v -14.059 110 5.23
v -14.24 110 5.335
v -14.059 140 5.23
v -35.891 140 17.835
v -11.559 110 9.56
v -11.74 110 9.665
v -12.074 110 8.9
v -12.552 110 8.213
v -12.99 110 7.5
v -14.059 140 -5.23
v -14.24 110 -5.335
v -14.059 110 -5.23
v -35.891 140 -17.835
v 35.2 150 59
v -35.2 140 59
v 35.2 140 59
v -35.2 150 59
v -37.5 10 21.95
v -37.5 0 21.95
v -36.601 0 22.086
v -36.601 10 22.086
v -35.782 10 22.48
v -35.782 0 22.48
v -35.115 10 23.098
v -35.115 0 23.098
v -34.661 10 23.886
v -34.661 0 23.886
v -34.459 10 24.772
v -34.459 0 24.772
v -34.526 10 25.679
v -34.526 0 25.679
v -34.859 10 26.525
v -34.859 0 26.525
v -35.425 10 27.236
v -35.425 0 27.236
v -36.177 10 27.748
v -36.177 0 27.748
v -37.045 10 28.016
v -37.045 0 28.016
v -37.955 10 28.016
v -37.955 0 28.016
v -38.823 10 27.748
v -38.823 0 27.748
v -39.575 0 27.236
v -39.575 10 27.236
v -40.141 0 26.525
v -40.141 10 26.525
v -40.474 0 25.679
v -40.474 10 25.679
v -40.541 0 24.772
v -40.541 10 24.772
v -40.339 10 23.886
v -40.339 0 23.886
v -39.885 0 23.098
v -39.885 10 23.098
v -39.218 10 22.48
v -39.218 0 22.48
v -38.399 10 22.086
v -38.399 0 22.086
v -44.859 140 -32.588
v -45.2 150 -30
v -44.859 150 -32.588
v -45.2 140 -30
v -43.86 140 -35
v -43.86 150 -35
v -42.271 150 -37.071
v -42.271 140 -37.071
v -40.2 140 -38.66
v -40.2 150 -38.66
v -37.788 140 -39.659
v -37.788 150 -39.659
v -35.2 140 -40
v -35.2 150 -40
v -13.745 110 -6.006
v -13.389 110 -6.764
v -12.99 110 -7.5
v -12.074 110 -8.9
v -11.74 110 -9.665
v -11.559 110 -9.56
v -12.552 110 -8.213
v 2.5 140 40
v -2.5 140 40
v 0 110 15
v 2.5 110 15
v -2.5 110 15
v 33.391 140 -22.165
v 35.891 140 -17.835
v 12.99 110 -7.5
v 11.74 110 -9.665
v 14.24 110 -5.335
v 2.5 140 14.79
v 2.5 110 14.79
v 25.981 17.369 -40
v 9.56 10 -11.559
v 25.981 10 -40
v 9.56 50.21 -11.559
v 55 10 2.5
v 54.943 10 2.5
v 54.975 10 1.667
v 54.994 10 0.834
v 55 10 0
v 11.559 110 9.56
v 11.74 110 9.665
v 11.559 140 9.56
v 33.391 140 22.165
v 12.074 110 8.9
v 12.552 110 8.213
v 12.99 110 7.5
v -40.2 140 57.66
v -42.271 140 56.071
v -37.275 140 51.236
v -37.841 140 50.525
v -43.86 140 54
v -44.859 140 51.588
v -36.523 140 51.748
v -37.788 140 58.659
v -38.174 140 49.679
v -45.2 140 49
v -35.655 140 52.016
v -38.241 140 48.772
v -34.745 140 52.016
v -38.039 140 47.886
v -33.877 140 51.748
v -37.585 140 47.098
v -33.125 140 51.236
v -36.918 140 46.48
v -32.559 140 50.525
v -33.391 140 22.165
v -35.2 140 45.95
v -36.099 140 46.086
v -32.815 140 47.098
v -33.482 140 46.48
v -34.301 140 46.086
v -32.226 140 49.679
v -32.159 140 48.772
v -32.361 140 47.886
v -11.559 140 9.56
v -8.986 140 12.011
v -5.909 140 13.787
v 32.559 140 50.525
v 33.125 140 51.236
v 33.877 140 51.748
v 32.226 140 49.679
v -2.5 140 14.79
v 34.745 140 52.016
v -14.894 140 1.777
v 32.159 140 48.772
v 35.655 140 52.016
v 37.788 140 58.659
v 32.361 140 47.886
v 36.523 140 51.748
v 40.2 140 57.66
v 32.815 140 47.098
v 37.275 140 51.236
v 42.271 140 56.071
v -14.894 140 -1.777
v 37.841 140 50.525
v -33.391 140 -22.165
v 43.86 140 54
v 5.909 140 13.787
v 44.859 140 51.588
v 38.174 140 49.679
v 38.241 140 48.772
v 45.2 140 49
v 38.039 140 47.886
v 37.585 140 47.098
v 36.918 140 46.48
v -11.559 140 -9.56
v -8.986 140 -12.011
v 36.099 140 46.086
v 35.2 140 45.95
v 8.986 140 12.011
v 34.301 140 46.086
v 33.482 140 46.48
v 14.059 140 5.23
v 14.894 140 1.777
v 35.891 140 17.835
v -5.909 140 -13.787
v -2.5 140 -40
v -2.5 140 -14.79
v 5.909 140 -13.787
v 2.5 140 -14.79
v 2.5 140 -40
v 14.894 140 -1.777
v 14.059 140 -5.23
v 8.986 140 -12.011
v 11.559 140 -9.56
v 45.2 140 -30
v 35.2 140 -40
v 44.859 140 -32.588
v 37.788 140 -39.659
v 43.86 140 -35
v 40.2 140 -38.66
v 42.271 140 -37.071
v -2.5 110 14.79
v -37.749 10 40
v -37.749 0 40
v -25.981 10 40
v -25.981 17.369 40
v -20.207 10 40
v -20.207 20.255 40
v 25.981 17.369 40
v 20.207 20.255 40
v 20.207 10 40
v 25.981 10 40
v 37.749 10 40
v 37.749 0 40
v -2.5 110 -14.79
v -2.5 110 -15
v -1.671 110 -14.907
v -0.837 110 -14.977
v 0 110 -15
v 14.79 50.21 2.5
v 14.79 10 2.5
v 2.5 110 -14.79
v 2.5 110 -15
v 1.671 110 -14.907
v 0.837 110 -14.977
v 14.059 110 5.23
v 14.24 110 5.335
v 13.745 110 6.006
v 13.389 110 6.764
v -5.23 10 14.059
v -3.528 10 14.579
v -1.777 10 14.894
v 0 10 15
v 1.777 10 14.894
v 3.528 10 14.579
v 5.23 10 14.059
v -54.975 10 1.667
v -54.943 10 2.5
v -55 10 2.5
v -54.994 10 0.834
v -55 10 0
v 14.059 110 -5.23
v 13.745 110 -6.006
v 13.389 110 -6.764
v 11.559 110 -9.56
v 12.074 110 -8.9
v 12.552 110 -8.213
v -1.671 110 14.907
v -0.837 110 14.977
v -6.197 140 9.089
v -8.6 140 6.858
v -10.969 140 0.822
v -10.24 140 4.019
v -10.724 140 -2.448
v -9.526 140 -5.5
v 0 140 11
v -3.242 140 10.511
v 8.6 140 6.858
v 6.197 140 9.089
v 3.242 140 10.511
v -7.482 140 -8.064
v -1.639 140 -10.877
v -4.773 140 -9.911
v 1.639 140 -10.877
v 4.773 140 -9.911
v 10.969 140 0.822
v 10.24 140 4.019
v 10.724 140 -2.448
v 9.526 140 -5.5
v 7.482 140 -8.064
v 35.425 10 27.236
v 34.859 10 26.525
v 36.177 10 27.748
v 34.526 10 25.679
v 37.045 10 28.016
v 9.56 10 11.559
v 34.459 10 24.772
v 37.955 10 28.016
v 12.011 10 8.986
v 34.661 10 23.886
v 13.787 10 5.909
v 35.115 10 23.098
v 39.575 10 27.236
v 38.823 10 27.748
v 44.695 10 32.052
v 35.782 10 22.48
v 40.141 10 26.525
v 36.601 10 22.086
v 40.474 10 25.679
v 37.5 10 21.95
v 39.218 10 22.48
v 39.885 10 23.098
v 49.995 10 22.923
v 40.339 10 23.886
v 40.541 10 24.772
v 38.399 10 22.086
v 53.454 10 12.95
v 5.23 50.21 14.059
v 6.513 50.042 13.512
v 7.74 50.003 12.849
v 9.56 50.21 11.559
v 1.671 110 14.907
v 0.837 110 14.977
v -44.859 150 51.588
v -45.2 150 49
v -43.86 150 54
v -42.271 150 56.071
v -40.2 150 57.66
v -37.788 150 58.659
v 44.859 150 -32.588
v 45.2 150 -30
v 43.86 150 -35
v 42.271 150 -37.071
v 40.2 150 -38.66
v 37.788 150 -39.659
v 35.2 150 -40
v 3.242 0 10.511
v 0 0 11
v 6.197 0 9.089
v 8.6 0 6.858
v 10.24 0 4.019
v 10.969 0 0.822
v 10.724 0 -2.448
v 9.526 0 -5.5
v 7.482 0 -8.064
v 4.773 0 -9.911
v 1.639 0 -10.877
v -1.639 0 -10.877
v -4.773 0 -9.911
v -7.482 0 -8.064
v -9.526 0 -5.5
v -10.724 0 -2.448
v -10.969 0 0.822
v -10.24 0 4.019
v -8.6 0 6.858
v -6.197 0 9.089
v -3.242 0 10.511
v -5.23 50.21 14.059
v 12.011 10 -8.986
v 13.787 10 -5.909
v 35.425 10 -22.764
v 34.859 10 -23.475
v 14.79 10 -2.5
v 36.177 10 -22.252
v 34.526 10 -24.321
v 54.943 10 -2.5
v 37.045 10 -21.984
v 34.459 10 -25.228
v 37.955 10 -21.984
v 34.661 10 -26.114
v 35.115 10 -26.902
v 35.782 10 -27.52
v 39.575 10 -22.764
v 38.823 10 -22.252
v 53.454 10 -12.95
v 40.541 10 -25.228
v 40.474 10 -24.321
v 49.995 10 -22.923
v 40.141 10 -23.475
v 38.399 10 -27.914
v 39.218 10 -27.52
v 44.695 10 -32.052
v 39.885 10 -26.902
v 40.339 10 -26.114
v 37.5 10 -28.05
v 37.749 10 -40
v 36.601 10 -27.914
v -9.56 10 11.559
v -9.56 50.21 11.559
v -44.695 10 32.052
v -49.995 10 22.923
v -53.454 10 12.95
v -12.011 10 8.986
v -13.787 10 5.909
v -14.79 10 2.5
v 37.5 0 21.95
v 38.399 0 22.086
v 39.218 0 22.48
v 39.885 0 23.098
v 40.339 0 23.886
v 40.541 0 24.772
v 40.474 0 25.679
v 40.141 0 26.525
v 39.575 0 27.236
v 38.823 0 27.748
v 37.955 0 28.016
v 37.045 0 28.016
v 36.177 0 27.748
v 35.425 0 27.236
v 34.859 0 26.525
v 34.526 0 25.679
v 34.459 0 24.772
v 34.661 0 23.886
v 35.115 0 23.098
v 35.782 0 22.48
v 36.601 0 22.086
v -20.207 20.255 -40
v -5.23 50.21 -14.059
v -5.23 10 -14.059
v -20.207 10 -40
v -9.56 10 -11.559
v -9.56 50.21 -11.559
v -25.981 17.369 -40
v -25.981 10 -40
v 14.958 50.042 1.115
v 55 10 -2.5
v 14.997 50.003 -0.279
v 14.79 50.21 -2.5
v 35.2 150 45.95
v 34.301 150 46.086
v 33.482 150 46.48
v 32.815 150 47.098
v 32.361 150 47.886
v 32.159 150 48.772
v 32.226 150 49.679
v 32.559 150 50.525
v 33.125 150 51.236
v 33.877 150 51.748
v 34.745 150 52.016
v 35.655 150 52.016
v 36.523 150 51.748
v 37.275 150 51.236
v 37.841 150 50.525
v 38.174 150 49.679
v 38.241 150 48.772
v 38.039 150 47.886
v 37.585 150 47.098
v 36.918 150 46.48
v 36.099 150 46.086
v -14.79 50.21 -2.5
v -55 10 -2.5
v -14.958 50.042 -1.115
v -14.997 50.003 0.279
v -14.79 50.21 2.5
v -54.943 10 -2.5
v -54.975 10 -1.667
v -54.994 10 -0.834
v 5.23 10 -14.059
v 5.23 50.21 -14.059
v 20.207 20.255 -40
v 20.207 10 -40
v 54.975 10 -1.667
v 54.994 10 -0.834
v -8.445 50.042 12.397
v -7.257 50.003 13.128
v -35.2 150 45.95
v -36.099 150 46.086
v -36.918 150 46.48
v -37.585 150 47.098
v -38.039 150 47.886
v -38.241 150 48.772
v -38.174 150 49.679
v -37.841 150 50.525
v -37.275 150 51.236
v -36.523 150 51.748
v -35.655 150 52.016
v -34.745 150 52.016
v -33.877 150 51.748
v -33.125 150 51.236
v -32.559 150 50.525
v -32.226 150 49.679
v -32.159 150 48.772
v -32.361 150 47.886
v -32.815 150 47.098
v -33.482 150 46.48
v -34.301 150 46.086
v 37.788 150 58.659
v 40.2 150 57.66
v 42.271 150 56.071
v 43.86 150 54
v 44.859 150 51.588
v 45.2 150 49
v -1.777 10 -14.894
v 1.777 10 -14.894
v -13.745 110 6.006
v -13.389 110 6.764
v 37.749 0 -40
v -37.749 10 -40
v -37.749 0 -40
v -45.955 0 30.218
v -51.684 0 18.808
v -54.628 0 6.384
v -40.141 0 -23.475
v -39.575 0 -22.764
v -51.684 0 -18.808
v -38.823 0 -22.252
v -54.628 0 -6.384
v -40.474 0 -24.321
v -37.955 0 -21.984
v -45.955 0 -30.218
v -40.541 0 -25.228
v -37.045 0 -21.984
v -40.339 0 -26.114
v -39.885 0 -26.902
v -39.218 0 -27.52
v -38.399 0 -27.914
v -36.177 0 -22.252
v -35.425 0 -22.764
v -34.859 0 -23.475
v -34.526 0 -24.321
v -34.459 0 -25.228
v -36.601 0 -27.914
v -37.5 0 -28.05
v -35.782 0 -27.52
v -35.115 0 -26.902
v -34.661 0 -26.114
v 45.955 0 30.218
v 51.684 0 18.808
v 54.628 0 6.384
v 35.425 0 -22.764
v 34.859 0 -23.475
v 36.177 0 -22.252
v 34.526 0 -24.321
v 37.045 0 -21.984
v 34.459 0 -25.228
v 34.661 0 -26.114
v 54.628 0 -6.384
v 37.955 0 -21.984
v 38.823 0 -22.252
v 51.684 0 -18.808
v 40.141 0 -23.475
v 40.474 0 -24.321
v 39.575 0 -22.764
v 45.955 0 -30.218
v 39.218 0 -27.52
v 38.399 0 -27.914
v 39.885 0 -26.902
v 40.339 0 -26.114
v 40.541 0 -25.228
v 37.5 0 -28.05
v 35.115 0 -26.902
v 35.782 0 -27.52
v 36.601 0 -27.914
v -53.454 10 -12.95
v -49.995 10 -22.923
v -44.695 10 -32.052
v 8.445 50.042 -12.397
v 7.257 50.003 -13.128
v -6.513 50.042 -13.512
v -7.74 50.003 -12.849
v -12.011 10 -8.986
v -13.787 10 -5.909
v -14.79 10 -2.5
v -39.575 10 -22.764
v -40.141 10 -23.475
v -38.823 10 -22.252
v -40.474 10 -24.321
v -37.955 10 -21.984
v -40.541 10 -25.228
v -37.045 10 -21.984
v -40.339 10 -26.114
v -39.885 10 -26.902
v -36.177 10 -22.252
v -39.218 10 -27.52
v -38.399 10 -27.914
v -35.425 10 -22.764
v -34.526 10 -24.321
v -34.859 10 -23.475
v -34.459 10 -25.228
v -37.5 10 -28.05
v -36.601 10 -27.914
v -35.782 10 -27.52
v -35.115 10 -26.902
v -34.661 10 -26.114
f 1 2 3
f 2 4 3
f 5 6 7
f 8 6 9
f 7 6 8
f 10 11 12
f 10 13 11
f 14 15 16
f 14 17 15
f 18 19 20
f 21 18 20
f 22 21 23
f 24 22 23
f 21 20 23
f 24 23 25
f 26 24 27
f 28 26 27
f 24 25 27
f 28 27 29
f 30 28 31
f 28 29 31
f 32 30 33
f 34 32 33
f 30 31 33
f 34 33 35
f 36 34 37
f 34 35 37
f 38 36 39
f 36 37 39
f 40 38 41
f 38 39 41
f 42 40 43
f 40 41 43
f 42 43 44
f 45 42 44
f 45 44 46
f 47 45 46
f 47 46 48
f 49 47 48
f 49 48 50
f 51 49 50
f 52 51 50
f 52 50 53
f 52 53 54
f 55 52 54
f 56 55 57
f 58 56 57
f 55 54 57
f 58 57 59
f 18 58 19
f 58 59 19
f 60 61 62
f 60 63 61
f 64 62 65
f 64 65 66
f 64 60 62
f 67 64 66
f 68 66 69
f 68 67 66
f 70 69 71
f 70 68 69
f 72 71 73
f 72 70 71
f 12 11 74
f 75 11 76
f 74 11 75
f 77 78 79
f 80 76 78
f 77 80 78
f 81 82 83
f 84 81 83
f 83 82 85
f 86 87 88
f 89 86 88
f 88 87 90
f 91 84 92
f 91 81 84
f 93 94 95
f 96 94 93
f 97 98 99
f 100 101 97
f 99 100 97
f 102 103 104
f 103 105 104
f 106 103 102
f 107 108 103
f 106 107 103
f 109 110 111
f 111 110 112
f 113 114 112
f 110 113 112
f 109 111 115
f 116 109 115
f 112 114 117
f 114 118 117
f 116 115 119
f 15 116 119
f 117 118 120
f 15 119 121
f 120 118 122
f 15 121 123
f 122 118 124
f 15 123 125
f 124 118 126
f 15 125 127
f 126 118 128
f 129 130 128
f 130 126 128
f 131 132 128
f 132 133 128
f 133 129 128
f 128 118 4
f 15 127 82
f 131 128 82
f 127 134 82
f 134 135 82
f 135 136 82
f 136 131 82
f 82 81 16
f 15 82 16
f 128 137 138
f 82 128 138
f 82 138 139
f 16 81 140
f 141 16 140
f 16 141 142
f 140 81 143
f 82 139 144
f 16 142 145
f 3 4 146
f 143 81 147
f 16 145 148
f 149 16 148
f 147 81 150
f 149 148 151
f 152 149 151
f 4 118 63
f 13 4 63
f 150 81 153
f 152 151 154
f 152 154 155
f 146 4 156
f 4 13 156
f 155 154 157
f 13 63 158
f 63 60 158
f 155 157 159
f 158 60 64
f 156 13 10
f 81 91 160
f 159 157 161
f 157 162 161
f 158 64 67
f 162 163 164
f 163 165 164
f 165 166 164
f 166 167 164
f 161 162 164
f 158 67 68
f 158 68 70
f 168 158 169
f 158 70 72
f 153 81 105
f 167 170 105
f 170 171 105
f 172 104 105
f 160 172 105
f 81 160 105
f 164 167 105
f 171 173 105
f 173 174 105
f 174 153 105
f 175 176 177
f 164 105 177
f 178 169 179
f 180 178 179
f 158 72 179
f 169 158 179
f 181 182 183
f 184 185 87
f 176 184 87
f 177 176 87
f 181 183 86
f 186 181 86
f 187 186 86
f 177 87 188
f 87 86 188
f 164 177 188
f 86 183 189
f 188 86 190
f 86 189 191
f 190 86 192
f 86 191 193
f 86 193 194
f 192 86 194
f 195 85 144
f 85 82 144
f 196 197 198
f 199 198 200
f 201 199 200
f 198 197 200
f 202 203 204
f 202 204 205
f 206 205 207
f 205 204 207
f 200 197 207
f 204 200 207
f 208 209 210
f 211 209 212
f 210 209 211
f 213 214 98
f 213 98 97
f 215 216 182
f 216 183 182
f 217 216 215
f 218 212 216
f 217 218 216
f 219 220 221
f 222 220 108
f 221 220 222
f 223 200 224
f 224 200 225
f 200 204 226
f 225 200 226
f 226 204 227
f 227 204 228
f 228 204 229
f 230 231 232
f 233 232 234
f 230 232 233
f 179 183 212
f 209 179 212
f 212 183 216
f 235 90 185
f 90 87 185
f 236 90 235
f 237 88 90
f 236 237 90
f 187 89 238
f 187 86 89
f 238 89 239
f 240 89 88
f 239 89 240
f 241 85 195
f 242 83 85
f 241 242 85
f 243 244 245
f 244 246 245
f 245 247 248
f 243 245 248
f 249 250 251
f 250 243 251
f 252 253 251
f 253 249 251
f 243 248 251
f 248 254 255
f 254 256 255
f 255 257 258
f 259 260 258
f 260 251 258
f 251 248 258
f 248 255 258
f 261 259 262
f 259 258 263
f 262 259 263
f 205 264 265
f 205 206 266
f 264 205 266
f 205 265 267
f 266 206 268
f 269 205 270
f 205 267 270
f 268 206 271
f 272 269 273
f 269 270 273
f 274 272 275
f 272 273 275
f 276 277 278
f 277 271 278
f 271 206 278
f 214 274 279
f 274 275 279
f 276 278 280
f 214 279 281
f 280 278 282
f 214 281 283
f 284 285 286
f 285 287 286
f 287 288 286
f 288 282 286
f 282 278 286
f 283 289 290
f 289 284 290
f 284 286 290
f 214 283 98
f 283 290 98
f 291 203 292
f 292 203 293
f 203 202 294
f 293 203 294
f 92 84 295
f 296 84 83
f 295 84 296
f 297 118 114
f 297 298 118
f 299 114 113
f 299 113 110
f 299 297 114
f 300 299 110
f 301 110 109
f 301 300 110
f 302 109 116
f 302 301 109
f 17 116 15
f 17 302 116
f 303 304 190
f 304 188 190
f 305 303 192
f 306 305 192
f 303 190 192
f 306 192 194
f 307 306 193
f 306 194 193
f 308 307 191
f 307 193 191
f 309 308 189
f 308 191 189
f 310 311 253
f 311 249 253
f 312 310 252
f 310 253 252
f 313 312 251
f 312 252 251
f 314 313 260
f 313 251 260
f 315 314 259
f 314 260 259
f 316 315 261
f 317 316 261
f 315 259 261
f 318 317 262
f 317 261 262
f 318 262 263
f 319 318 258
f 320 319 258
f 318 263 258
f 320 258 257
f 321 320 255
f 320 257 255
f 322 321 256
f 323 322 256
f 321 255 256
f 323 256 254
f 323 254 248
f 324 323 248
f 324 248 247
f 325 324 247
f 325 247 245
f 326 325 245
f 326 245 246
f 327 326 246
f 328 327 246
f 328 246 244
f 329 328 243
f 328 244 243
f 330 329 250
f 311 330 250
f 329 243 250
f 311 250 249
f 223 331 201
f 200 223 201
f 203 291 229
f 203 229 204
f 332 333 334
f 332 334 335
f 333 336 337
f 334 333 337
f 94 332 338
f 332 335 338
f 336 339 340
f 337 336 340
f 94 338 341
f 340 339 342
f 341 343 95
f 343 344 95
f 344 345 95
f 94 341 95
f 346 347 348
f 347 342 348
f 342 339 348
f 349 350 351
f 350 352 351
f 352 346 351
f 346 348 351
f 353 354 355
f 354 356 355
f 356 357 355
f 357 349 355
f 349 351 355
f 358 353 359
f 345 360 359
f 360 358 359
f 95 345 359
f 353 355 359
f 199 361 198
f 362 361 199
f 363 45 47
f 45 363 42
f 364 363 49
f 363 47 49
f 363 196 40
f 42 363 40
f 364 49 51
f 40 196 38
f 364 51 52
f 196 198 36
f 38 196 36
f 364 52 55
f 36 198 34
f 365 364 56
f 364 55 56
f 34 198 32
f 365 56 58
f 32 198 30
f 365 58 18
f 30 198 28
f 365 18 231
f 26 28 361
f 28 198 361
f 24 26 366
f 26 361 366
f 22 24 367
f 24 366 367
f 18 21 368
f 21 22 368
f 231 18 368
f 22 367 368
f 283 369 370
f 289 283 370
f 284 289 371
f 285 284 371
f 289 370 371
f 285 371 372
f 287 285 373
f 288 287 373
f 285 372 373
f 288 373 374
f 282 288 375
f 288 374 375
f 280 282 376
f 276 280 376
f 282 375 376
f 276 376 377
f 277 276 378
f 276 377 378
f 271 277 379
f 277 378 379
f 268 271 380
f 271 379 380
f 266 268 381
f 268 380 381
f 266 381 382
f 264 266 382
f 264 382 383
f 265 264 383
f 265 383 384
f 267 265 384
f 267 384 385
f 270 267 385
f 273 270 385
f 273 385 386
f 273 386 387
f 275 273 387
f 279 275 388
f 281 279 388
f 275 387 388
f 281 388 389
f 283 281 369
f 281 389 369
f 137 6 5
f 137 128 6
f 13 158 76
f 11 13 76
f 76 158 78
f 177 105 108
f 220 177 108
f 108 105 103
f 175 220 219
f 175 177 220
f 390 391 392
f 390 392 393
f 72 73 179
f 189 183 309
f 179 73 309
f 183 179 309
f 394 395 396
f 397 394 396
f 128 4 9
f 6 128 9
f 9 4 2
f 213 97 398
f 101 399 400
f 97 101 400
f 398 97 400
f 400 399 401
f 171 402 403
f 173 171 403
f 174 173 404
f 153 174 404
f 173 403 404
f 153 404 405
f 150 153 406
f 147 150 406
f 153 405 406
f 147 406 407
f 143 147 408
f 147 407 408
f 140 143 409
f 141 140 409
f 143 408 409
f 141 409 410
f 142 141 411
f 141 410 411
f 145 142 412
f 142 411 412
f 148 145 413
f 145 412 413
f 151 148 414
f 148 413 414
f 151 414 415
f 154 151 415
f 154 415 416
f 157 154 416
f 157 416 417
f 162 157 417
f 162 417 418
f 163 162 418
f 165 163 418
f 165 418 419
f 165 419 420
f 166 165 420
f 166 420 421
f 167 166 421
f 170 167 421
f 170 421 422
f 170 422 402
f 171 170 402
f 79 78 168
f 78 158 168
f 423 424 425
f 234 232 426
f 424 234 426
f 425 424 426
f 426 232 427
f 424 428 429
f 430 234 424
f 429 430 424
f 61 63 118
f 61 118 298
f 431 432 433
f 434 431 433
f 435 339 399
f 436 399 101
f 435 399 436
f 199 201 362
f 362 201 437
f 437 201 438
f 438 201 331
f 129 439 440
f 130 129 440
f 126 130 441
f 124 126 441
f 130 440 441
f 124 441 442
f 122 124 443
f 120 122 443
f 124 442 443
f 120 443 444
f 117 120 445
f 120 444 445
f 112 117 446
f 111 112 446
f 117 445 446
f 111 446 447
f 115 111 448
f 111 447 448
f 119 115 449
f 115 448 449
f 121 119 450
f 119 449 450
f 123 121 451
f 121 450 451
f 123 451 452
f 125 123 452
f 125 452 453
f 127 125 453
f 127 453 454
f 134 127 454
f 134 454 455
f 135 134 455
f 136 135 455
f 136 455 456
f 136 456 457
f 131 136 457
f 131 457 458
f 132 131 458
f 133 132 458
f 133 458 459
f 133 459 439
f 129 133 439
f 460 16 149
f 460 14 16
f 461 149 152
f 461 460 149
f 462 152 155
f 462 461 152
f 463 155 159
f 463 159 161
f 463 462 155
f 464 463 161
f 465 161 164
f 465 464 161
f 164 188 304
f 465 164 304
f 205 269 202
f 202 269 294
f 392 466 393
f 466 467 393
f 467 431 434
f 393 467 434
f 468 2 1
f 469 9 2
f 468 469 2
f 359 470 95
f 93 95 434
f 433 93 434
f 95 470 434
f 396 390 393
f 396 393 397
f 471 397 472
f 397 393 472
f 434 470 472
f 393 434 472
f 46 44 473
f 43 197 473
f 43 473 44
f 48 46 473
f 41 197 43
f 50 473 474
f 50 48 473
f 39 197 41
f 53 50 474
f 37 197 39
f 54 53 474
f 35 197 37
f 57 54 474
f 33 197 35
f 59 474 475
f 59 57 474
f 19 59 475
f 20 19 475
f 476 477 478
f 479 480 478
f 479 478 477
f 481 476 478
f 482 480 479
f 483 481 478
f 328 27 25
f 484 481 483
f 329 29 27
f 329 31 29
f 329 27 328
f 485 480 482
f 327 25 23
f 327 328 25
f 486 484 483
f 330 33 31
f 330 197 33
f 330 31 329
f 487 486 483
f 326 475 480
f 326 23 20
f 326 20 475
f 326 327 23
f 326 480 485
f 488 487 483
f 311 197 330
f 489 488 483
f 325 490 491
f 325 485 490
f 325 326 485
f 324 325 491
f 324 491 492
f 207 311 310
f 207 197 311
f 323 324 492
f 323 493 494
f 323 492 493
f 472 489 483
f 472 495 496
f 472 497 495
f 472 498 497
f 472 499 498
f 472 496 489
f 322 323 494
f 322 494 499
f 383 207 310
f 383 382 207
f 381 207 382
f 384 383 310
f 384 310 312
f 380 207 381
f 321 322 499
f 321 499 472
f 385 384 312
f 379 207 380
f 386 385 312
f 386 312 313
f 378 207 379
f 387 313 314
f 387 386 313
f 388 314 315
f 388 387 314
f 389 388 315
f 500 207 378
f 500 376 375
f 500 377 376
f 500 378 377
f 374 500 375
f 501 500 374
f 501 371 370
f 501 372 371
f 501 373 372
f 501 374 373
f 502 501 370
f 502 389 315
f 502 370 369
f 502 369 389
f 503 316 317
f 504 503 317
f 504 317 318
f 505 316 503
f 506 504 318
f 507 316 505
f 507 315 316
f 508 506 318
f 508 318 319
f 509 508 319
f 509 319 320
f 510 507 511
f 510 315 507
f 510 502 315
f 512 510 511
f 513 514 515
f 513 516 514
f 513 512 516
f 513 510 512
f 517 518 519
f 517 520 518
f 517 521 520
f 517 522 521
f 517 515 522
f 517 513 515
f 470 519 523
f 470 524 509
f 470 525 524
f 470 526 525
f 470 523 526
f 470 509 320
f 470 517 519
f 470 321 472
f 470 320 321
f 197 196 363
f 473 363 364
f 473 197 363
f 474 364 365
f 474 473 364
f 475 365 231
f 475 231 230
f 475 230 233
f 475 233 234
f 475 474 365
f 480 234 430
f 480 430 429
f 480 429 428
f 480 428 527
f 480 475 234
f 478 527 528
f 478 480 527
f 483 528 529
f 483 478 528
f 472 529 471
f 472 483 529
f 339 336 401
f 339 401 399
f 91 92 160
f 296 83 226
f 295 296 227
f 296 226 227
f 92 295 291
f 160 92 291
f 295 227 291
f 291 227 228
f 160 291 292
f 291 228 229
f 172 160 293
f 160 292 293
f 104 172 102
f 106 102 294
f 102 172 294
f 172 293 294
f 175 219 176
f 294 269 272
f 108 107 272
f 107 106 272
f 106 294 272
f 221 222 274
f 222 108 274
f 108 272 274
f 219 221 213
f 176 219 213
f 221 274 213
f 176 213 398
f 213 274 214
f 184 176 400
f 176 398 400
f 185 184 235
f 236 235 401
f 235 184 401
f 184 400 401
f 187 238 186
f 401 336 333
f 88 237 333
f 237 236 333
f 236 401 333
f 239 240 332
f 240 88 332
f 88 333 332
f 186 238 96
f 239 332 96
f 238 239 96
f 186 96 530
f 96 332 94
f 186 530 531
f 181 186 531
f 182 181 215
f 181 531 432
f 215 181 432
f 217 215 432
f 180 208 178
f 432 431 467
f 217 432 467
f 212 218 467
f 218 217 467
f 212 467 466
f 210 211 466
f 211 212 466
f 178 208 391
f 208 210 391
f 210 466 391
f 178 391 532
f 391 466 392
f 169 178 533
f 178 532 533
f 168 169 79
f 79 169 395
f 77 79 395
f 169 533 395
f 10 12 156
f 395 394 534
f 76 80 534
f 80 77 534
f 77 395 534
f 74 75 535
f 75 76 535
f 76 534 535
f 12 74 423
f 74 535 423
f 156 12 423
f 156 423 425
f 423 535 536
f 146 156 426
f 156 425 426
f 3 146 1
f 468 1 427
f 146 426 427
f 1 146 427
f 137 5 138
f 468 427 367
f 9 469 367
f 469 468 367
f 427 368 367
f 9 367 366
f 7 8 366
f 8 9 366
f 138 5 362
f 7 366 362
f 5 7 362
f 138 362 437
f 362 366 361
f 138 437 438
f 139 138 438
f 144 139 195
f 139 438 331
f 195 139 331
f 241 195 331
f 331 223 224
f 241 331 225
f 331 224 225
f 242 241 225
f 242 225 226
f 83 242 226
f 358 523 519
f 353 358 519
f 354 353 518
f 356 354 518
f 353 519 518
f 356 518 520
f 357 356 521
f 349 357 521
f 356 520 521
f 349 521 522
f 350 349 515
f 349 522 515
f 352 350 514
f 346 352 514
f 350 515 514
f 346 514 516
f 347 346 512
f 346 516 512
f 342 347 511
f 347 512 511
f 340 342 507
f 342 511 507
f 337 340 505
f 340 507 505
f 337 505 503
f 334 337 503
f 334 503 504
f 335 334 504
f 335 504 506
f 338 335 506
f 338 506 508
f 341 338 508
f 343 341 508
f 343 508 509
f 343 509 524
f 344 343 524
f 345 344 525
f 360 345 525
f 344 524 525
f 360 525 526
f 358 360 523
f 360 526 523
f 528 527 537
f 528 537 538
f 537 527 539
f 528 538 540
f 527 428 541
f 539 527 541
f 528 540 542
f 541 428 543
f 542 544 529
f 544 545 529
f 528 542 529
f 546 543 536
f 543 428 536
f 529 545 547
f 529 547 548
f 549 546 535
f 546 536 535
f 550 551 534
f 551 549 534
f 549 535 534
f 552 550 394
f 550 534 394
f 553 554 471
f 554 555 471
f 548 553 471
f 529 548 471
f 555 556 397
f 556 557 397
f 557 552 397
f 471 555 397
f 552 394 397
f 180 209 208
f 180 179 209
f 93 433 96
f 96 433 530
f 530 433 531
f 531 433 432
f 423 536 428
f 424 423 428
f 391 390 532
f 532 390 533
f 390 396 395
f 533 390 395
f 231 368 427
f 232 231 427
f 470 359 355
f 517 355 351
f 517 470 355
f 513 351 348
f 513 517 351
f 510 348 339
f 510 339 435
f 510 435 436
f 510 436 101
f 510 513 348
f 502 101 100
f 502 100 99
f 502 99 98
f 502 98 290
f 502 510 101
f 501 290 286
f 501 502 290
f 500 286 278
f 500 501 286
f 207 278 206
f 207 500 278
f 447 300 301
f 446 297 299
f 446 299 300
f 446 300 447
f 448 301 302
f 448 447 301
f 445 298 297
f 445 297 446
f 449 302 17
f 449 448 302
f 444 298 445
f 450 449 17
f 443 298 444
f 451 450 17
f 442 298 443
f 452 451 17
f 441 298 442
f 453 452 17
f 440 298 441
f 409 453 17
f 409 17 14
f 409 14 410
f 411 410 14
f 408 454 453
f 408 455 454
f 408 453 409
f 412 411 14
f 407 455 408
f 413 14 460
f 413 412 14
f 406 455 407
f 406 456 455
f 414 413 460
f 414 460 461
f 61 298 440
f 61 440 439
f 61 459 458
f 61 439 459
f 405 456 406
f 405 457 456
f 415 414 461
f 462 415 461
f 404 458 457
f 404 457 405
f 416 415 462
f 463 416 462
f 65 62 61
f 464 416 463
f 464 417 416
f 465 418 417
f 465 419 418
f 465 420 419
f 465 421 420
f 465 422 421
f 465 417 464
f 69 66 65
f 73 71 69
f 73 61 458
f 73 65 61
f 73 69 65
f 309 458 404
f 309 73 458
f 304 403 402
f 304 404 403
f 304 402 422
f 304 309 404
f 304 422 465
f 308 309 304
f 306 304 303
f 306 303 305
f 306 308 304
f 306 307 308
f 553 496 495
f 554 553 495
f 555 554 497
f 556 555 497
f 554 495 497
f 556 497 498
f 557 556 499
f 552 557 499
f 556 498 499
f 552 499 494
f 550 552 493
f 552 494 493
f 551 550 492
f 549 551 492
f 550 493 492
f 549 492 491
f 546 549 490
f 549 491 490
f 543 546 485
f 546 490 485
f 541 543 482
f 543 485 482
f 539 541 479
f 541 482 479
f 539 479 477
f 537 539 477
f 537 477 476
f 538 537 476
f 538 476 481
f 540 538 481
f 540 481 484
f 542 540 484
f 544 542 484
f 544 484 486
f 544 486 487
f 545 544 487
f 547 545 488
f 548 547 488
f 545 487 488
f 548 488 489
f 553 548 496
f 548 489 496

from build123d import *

# Parameters (mm, degrees)
SKETCH1_R                      = 2.55
SKETCH1_R_2                    = 11
BASE_DEPTH                     = 5
SKETCH1_3_R                    = 15
SKETCH1_3_R_2                  = 11
STEM_DEPTH                     = 150
SKETCH4_W                      = 90.4
SKETCH4_H                      = 80
TOP_PLATE_DEPTH                = 10
SKETCH6_W                      = 90.4
SKETCH6_H                      = 10
BOSS_EXTRUDE7_DEPTH            = 19
RIB1_START                     = -2.5
RIB1_DEPTH                     = 5
CIRPATTERN6_COUNT              = 6
CUT_EXTRUDE1_REACH             = 170.039
SKETCH10_R                     = 3.05
CUT_EXTRUDE1_DIRECTION_2_DEPTH = 169.039429897
FILLET1_R                      = 10
FILLET2_R                      = 10
SKETCH11_R                     = 55
NEW_BASE_DEPTH                 = 10
RIB2_START                     = -2.5
RIB2_DEPTH                     = 5
CIRPATTERN7_COUNT              = 6
SKETCH13_R                     = 3.05
CUT_EXTRUDE2_DEPTH             = 10
FILLET3_R                      = 10
SKETCH15_R                     = 11
REMOVE_CENTER_DEPTH            = 162.573512681
BASE_CUT_DEPTH                 = 40


with BuildPart() as part:
    # Sketch1 → base (new body)
    with BuildSketch(Plane(origin=(0, 0, 0), x_dir=(1, 0, 0), z_dir=(0, 1, 0))):
        with BuildLine():
            Line((-16, 25.377155081), (-42.833333333, 8.459051694))
            ThreePointArc((-42.833333333, 8.459051694), (-47.5, 0), (-42.833333333, -8.459051694))
            Line((-42.833333333, -8.459051694), (-16, -25.377155081))
            ThreePointArc((-16, -25.377155081), (0, -30), (16, -25.377155081))
            Line((16, -25.377155081), (42.833333333, -8.459051694))
            ThreePointArc((42.833333333, -8.459051694), (47.5, 0), (42.833333333, 8.459051694))
            Line((42.833333333, 8.459051694), (16, 25.377155081))
            ThreePointArc((16, 25.377155081), (0, 30), (-16, 25.377155081))
        make_face()
        with Locations(Location((-37.5, 0, 0), (0, 0, 270))):
            Circle(SKETCH1_R, mode=Mode.SUBTRACT)
        with Locations(Location((37.5, 0, 0), (0, 0, 270))):
            Circle(SKETCH1_R, mode=Mode.SUBTRACT)
        with Locations(Location((0, 0, 0), (0, 0, 270))):
            Circle(SKETCH1_R_2, mode=Mode.SUBTRACT)
    extrude(amount=BASE_DEPTH)

    # Sketch1<3> → stem (add)
    with BuildSketch(Plane(origin=(0, 0, 0), x_dir=(1, 0, 0), z_dir=(0, 1, 0))):
        with Locations(Location((0, 0, 0), (0, 0, 270))):
            Circle(SKETCH1_3_R)
        with Locations(Location((0, 0, 0), (0, 0, 270))):
            Circle(SKETCH1_3_R_2, mode=Mode.SUBTRACT)
    extrude(amount=STEM_DEPTH)

    # Sketch4 → top plate (add)
    with BuildSketch(Plane(origin=(0, 150, 0), x_dir=(1, 0, 0), z_dir=(0, 1, 0))):
        Rectangle(SKETCH4_W, SKETCH4_H)
    extrude(amount=-TOP_PLATE_DEPTH)

    # Sketch6 → Boss-Extrude7 (add)
    with BuildSketch(Plane.XY.offset(40)):
        with Locations((0, 145)):
            Rectangle(SKETCH6_W, SKETCH6_H)
    extrude(amount=BOSS_EXTRUDE7_DEPTH)

    # Rib1: read off the stored shape, not the designer's step
    # Rib1 outline → Rib1 (add)
    with BuildSketch(Plane(origin=(0, 0, 0), x_dir=(0, 0, -1), z_dir=(1, 0, 0)).offset(RIB1_START)):
        Polygon((-15, 110), (-14.790199458, 110), (-14.790199458, 140), (-40, 140), align=None)
    rib1 = extrude(amount=RIB1_DEPTH)

    # CirPattern6: Rib1 ×6 about axis
    cirpattern6_axis = Axis((0, 0, 0), (0, 1, 0))
    for i in range(1, CIRPATTERN6_COUNT):
        add(rib1.rotate(cirpattern6_axis, i * 360 / CIRPATTERN6_COUNT))

    # Sketch10 → Cut-Extrude1 (cut, up to next)
    with BuildSketch(Plane(origin=(0, 150, 0), x_dir=(1, 0, 0), z_dir=(0, 1, 0)), mode=Mode.PRIVATE) as cut_extrude1_sk1:
        with Locations(Location((35.2, -49, 0), (0, 0, 90))):
            Circle(SKETCH10_R)
    cut_extrude1_tool1 = extrude(cut_extrude1_sk1.sketch, amount=-CUT_EXTRUDE1_REACH, mode=Mode.PRIVATE) & part.part
    # Sketch10 → Cut-Extrude1 (cut, up to next)
    with BuildSketch(Plane(origin=(0, 150, 0), x_dir=(1, 0, 0), z_dir=(0, 1, 0)), mode=Mode.PRIVATE) as cut_extrude1_sk2:
        with Locations(Location((-35.2, -49, 0), (0, 0, 90))):
            Circle(SKETCH10_R)
    cut_extrude1_tool2 = extrude(cut_extrude1_sk2.sketch, amount=-CUT_EXTRUDE1_REACH, mode=Mode.PRIVATE) & part.part
    add(cut_extrude1_tool1.solids().sort_by_distance((35.2, 150, 49))[0], mode=Mode.SUBTRACT)
    add(cut_extrude1_tool2.solids().sort_by_distance((-35.2, 150, 49))[0], mode=Mode.SUBTRACT)

    # Sketch10 → Cut-Extrude1 direction 2 (cut)
    with BuildSketch(Plane(origin=(0, 150, 0), x_dir=(1, 0, 0), z_dir=(0, 1, 0))):
        with Locations(Location((35.2, -49, 0), (0, 0, 90))):
            Circle(SKETCH10_R)
        with Locations(Location((-35.2, -49, 0), (0, 0, 90))):
            Circle(SKETCH10_R)
    extrude(amount=CUT_EXTRUDE1_DIRECTION_2_DEPTH, mode=Mode.SUBTRACT)

    # Fillet1
    fillet1_edges = [part.edges().sort_by_distance(p)[0] for p in [
        (-45.2, 145, 59),
    ]]
    fillet(fillet1_edges, radius=FILLET1_R)

    # Fillet2
    fillet2_edges = [part.edges().sort_by_distance(p)[0] for p in [
        (45.2, 145, 59),
    ]]
    fillet(fillet2_edges, radius=FILLET2_R)

    # Sketch11 → new base (add)
    with BuildSketch(Plane.XZ):
        with Locations(Location((0, 0, 0), (0, 0, 270))):
            Circle(SKETCH11_R)
    extrude(amount=-NEW_BASE_DEPTH)

    # Rib2: read off the stored shape, not the designer's step
    # Rib2 outline → Rib2 (add)
    with BuildSketch(Plane.XY.offset(RIB2_START)):
        Polygon((13, 10), (55, 10), (13, 52), align=None)
    rib2 = extrude(amount=RIB2_DEPTH)

    # CirPattern7: Rib2 ×6 about axis
    cirpattern7_axis = Axis((0, 0, 0), (0, 1, 0))
    for i in range(1, CIRPATTERN7_COUNT):
        add(rib2.rotate(cirpattern7_axis, i * 360 / CIRPATTERN7_COUNT))

    # Sketch13 → Cut-Extrude2 (cut)
    with BuildSketch(Plane.XZ):
        with Locations(Location((-37.5, -25, 0), (0, 0, 270))):
            Circle(SKETCH13_R)
        with Locations(Location((-37.5, 25, 0), (0, 0, 270))):
            Circle(SKETCH13_R)
        with Locations(Location((37.5, 25, 0), (0, 0, 270))):
            Circle(SKETCH13_R)
        with Locations(Location((37.5, -25, 0), (0, 0, 270))):
            Circle(SKETCH13_R)
    extrude(amount=-CUT_EXTRUDE2_DEPTH, mode=Mode.SUBTRACT)

    # Fillet3
    fillet3_edges = [part.edges().sort_by_distance(p)[0] for p in [
        (45.2, 145, -40),
        (-45.2, 145, -40),
    ]]
    fillet(fillet3_edges, radius=FILLET3_R)

    # Sketch15 → remove center (cut, through all)
    with BuildSketch(Plane(origin=(0, 10, 0), x_dir=(1, 0, 0), z_dir=(0, 1, 0))):
        with Locations(Location((0, 0, 0), (0, 0, 270))):
            Circle(SKETCH15_R)
    extrude(amount=-REMOVE_CENTER_DEPTH, mode=Mode.SUBTRACT)

    # Sketch16 → base cut (cut)
    with BuildSketch(Plane.XZ):
        with BuildLine():
            Line((-37.749172176, 40), (37.749172176, 40))
            ThreePointArc((37.749172176, 40), (0, 55), (-37.749172176, 40))
        make_face()
        with BuildLine():
            ThreePointArc((-37.749172176, -40), (0, -55), (37.749172176, -40))
            Line((37.749172176, -40), (-37.749172176, -40))
        make_face()
    extrude(amount=-BASE_CUT_DEPTH, mode=Mode.SUBTRACT)


with BuildPart() as base_cut_kept_piece:
    # of the separate pieces the step leaves, the one the design keeps (base_cut_pieces_kept)
    add(part.part.solids().sort_by_distance((45.2, 140, -30))[0])


solid = base_cut_kept_piece.part
